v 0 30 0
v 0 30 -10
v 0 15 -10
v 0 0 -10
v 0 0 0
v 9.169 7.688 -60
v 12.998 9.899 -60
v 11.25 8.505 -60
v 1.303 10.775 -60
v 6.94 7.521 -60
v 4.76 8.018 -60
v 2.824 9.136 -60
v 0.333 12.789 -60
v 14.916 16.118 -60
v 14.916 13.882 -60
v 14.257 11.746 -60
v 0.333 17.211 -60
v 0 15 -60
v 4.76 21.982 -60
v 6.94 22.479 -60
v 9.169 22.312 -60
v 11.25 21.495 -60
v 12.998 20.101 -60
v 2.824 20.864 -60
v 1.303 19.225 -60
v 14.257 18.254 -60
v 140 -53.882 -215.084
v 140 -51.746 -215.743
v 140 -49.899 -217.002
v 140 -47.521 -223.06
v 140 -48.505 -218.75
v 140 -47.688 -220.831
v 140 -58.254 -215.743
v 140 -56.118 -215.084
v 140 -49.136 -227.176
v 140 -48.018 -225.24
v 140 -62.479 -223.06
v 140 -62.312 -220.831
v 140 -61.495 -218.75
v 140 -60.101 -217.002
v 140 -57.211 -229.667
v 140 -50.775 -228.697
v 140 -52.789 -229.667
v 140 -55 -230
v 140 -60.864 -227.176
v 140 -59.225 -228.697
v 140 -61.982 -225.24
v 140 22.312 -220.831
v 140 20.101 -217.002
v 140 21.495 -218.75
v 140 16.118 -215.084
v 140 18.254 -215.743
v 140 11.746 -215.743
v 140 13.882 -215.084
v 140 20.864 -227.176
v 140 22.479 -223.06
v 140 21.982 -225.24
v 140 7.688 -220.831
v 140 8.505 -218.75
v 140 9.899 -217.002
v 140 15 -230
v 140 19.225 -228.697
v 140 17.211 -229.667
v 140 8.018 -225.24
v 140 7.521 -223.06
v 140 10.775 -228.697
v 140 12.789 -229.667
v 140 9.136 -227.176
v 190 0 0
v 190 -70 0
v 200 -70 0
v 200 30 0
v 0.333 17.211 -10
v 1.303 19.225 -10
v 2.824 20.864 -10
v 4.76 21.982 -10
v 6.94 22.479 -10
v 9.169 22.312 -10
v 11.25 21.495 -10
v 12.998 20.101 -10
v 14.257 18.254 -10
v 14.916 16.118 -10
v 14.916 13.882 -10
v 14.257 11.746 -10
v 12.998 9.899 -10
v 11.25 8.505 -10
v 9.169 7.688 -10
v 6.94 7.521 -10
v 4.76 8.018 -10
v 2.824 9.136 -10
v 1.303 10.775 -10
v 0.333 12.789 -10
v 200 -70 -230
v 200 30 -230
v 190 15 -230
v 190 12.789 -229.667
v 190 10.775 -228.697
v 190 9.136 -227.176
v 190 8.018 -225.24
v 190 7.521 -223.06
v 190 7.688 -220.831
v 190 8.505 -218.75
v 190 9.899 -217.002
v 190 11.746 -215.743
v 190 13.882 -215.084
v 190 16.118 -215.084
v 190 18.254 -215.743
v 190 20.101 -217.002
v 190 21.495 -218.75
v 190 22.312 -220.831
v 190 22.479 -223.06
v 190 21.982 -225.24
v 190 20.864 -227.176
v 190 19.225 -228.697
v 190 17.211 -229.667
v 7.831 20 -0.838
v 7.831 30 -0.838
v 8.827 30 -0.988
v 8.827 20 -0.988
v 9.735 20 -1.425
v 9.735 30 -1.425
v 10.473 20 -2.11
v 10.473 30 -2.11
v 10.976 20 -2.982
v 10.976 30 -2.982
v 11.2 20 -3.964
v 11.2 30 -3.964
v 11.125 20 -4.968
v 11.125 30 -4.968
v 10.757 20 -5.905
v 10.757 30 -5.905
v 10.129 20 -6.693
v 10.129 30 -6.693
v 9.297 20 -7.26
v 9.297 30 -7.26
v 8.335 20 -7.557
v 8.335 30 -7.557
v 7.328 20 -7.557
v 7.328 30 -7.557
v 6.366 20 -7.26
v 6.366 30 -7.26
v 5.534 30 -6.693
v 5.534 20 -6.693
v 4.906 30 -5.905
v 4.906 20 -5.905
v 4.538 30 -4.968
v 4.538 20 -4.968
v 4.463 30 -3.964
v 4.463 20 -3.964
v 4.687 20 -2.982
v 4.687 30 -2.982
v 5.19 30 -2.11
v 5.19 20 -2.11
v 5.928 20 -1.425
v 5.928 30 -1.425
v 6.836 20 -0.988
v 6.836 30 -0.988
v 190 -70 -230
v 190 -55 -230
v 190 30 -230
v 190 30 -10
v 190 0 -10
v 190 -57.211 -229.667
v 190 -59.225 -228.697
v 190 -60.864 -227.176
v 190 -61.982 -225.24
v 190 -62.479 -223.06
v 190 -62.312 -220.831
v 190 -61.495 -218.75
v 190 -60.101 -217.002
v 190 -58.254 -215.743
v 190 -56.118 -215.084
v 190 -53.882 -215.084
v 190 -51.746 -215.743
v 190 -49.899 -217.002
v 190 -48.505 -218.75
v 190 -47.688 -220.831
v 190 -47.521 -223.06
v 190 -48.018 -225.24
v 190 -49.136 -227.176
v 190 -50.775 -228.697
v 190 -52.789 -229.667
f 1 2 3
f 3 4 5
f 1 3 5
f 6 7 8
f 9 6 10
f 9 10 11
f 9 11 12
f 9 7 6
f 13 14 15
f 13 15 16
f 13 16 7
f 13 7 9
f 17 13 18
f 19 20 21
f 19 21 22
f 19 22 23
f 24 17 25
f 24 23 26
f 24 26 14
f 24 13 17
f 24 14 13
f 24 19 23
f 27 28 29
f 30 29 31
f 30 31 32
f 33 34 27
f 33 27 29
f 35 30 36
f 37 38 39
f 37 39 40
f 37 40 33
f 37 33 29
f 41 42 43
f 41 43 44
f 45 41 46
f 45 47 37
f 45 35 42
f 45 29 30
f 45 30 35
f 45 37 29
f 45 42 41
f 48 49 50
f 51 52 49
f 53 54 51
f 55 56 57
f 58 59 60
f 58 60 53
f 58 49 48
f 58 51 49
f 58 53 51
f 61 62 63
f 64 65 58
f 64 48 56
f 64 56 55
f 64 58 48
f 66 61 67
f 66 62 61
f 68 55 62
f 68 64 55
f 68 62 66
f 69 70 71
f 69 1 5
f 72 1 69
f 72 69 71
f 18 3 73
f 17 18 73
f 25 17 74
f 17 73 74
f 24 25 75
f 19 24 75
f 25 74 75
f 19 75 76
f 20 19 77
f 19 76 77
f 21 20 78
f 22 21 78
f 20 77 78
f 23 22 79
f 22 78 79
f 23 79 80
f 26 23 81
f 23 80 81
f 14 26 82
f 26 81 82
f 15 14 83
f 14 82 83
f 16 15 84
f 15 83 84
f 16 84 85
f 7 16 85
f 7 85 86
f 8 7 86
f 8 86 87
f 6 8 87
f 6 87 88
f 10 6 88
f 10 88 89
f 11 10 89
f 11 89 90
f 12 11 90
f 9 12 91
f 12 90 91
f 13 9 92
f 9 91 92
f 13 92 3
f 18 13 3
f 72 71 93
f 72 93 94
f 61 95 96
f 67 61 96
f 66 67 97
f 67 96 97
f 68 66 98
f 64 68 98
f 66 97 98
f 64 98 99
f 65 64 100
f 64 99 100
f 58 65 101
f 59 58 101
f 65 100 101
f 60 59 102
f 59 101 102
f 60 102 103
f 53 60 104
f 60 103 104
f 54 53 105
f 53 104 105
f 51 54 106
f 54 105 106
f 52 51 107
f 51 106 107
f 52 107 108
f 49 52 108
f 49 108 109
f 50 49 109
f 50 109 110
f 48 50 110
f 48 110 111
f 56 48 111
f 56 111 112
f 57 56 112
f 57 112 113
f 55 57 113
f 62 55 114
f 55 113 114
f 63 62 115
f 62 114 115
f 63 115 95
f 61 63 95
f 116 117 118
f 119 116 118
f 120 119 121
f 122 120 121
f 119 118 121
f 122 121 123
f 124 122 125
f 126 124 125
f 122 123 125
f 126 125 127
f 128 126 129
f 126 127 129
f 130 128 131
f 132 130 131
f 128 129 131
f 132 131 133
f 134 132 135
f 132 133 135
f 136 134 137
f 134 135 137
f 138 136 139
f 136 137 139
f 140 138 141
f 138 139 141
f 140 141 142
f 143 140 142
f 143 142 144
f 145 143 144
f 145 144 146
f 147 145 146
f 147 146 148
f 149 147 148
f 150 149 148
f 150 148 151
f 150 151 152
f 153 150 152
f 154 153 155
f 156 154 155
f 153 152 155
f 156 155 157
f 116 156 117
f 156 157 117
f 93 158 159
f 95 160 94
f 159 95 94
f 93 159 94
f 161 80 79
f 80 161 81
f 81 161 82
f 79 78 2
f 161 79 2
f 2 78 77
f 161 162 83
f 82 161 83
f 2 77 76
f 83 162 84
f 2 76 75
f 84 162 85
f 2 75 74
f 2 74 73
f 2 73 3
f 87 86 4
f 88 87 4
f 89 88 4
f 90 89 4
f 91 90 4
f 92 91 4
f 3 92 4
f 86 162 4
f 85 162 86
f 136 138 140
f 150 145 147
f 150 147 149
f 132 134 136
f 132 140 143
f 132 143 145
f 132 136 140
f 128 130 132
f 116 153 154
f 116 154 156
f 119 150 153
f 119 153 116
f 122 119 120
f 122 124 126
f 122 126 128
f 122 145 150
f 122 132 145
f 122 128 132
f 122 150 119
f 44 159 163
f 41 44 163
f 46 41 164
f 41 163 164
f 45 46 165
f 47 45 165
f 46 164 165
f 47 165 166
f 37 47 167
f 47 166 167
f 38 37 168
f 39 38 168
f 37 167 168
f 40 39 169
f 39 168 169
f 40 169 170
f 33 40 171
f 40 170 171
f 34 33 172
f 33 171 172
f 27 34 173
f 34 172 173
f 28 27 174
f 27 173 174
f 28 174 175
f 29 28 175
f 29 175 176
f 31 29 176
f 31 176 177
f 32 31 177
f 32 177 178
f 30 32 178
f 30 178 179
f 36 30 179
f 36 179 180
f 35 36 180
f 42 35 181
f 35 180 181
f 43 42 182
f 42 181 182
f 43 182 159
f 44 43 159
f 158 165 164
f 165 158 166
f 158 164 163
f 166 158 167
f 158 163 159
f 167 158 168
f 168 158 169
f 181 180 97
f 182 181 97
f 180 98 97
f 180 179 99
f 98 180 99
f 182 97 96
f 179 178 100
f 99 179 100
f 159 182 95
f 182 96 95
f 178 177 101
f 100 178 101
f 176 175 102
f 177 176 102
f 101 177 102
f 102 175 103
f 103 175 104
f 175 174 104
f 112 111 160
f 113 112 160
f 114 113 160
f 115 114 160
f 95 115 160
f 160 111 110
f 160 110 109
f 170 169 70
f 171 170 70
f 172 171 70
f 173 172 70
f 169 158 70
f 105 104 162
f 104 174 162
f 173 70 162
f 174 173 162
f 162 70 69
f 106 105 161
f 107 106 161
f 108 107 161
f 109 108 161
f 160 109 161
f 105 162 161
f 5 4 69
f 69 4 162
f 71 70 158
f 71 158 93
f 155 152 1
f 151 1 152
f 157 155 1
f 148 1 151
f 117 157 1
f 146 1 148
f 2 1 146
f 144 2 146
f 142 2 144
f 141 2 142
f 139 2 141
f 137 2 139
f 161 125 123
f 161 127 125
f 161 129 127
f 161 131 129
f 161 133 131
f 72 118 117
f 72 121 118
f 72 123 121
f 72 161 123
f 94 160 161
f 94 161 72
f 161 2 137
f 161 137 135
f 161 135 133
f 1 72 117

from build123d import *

# Parameters (mm, degrees)
BODY_DEPTH          = 30
SKETCH2_R           = 7.5
ROTATING_PIN_DEPTH  = 50
SKETCH3_R           = 7.5
BOSS_EXTRUDE3_DEPTH = 50
SKETCH4_W           = 10
SKETCH4_H           = 100
BOSS_EXTRUDE4_DEPTH = 230
SKETCH5_R           = 7.5
BOSS_EXTRUDE5_DEPTH = 50
SKETCH6_R           = 3.378341257
CUT_EXTRUDE1_DEPTH  = 10


with BuildPart() as part:
    # Sketch1 → body (new body)
    with BuildSketch(Plane(origin=(0, 0, 0), x_dir=(1, 0, 0), z_dir=(0, 1, 0))):
        Polygon((0, 0), (200, 0), (200, 230), (190, 230), (190, 10), (0, 10), align=None)
    extrude(amount=BODY_DEPTH)

    # Sketch2 → rotating pin (add)
    with BuildSketch(Plane(origin=(0, 0, -10), x_dir=(-1, 0, 0), z_dir=(0, 0, -1))):
        with Locations((-7.5, 15)):
            Circle(SKETCH2_R)
    extrude(amount=ROTATING_PIN_DEPTH)

    # Sketch3 → Boss-Extrude3 (add)
    with BuildSketch(Plane.ZY.offset(-190)):
        with Locations(Location((-222.5, 15, 0), (0, 0, 180))):
            Circle(SKETCH3_R)
    extrude(amount=BOSS_EXTRUDE3_DEPTH)

    # Sketch4 → Boss-Extrude4 (add, through all)
    with BuildSketch(Plane.XY):
        with Locations((195, -20)):
            Rectangle(SKETCH4_W, SKETCH4_H)
    extrude(amount=-BOSS_EXTRUDE4_DEPTH)

    # Sketch5 → Boss-Extrude5 (add)
    with BuildSketch(Plane.ZY.offset(-190)):
        with Locations(Location((-222.5, -55, 0), (0, 0, 180))):
            Circle(SKETCH5_R)
    extrude(amount=BOSS_EXTRUDE5_DEPTH)

    # Sketch6 → Cut-Extrude1 (cut)
    with BuildSketch(Plane(origin=(0, 30, 0), x_dir=(1, 0, 0), z_dir=(0, 1, 0))):
        with Locations(Location((7.831461534, 4.216291967, 0), (0, 0, 270))):
            Circle(SKETCH6_R)
    extrude(amount=-CUT_EXTRUDE1_DEPTH, mode=Mode.SUBTRACT)


solid = part.part
